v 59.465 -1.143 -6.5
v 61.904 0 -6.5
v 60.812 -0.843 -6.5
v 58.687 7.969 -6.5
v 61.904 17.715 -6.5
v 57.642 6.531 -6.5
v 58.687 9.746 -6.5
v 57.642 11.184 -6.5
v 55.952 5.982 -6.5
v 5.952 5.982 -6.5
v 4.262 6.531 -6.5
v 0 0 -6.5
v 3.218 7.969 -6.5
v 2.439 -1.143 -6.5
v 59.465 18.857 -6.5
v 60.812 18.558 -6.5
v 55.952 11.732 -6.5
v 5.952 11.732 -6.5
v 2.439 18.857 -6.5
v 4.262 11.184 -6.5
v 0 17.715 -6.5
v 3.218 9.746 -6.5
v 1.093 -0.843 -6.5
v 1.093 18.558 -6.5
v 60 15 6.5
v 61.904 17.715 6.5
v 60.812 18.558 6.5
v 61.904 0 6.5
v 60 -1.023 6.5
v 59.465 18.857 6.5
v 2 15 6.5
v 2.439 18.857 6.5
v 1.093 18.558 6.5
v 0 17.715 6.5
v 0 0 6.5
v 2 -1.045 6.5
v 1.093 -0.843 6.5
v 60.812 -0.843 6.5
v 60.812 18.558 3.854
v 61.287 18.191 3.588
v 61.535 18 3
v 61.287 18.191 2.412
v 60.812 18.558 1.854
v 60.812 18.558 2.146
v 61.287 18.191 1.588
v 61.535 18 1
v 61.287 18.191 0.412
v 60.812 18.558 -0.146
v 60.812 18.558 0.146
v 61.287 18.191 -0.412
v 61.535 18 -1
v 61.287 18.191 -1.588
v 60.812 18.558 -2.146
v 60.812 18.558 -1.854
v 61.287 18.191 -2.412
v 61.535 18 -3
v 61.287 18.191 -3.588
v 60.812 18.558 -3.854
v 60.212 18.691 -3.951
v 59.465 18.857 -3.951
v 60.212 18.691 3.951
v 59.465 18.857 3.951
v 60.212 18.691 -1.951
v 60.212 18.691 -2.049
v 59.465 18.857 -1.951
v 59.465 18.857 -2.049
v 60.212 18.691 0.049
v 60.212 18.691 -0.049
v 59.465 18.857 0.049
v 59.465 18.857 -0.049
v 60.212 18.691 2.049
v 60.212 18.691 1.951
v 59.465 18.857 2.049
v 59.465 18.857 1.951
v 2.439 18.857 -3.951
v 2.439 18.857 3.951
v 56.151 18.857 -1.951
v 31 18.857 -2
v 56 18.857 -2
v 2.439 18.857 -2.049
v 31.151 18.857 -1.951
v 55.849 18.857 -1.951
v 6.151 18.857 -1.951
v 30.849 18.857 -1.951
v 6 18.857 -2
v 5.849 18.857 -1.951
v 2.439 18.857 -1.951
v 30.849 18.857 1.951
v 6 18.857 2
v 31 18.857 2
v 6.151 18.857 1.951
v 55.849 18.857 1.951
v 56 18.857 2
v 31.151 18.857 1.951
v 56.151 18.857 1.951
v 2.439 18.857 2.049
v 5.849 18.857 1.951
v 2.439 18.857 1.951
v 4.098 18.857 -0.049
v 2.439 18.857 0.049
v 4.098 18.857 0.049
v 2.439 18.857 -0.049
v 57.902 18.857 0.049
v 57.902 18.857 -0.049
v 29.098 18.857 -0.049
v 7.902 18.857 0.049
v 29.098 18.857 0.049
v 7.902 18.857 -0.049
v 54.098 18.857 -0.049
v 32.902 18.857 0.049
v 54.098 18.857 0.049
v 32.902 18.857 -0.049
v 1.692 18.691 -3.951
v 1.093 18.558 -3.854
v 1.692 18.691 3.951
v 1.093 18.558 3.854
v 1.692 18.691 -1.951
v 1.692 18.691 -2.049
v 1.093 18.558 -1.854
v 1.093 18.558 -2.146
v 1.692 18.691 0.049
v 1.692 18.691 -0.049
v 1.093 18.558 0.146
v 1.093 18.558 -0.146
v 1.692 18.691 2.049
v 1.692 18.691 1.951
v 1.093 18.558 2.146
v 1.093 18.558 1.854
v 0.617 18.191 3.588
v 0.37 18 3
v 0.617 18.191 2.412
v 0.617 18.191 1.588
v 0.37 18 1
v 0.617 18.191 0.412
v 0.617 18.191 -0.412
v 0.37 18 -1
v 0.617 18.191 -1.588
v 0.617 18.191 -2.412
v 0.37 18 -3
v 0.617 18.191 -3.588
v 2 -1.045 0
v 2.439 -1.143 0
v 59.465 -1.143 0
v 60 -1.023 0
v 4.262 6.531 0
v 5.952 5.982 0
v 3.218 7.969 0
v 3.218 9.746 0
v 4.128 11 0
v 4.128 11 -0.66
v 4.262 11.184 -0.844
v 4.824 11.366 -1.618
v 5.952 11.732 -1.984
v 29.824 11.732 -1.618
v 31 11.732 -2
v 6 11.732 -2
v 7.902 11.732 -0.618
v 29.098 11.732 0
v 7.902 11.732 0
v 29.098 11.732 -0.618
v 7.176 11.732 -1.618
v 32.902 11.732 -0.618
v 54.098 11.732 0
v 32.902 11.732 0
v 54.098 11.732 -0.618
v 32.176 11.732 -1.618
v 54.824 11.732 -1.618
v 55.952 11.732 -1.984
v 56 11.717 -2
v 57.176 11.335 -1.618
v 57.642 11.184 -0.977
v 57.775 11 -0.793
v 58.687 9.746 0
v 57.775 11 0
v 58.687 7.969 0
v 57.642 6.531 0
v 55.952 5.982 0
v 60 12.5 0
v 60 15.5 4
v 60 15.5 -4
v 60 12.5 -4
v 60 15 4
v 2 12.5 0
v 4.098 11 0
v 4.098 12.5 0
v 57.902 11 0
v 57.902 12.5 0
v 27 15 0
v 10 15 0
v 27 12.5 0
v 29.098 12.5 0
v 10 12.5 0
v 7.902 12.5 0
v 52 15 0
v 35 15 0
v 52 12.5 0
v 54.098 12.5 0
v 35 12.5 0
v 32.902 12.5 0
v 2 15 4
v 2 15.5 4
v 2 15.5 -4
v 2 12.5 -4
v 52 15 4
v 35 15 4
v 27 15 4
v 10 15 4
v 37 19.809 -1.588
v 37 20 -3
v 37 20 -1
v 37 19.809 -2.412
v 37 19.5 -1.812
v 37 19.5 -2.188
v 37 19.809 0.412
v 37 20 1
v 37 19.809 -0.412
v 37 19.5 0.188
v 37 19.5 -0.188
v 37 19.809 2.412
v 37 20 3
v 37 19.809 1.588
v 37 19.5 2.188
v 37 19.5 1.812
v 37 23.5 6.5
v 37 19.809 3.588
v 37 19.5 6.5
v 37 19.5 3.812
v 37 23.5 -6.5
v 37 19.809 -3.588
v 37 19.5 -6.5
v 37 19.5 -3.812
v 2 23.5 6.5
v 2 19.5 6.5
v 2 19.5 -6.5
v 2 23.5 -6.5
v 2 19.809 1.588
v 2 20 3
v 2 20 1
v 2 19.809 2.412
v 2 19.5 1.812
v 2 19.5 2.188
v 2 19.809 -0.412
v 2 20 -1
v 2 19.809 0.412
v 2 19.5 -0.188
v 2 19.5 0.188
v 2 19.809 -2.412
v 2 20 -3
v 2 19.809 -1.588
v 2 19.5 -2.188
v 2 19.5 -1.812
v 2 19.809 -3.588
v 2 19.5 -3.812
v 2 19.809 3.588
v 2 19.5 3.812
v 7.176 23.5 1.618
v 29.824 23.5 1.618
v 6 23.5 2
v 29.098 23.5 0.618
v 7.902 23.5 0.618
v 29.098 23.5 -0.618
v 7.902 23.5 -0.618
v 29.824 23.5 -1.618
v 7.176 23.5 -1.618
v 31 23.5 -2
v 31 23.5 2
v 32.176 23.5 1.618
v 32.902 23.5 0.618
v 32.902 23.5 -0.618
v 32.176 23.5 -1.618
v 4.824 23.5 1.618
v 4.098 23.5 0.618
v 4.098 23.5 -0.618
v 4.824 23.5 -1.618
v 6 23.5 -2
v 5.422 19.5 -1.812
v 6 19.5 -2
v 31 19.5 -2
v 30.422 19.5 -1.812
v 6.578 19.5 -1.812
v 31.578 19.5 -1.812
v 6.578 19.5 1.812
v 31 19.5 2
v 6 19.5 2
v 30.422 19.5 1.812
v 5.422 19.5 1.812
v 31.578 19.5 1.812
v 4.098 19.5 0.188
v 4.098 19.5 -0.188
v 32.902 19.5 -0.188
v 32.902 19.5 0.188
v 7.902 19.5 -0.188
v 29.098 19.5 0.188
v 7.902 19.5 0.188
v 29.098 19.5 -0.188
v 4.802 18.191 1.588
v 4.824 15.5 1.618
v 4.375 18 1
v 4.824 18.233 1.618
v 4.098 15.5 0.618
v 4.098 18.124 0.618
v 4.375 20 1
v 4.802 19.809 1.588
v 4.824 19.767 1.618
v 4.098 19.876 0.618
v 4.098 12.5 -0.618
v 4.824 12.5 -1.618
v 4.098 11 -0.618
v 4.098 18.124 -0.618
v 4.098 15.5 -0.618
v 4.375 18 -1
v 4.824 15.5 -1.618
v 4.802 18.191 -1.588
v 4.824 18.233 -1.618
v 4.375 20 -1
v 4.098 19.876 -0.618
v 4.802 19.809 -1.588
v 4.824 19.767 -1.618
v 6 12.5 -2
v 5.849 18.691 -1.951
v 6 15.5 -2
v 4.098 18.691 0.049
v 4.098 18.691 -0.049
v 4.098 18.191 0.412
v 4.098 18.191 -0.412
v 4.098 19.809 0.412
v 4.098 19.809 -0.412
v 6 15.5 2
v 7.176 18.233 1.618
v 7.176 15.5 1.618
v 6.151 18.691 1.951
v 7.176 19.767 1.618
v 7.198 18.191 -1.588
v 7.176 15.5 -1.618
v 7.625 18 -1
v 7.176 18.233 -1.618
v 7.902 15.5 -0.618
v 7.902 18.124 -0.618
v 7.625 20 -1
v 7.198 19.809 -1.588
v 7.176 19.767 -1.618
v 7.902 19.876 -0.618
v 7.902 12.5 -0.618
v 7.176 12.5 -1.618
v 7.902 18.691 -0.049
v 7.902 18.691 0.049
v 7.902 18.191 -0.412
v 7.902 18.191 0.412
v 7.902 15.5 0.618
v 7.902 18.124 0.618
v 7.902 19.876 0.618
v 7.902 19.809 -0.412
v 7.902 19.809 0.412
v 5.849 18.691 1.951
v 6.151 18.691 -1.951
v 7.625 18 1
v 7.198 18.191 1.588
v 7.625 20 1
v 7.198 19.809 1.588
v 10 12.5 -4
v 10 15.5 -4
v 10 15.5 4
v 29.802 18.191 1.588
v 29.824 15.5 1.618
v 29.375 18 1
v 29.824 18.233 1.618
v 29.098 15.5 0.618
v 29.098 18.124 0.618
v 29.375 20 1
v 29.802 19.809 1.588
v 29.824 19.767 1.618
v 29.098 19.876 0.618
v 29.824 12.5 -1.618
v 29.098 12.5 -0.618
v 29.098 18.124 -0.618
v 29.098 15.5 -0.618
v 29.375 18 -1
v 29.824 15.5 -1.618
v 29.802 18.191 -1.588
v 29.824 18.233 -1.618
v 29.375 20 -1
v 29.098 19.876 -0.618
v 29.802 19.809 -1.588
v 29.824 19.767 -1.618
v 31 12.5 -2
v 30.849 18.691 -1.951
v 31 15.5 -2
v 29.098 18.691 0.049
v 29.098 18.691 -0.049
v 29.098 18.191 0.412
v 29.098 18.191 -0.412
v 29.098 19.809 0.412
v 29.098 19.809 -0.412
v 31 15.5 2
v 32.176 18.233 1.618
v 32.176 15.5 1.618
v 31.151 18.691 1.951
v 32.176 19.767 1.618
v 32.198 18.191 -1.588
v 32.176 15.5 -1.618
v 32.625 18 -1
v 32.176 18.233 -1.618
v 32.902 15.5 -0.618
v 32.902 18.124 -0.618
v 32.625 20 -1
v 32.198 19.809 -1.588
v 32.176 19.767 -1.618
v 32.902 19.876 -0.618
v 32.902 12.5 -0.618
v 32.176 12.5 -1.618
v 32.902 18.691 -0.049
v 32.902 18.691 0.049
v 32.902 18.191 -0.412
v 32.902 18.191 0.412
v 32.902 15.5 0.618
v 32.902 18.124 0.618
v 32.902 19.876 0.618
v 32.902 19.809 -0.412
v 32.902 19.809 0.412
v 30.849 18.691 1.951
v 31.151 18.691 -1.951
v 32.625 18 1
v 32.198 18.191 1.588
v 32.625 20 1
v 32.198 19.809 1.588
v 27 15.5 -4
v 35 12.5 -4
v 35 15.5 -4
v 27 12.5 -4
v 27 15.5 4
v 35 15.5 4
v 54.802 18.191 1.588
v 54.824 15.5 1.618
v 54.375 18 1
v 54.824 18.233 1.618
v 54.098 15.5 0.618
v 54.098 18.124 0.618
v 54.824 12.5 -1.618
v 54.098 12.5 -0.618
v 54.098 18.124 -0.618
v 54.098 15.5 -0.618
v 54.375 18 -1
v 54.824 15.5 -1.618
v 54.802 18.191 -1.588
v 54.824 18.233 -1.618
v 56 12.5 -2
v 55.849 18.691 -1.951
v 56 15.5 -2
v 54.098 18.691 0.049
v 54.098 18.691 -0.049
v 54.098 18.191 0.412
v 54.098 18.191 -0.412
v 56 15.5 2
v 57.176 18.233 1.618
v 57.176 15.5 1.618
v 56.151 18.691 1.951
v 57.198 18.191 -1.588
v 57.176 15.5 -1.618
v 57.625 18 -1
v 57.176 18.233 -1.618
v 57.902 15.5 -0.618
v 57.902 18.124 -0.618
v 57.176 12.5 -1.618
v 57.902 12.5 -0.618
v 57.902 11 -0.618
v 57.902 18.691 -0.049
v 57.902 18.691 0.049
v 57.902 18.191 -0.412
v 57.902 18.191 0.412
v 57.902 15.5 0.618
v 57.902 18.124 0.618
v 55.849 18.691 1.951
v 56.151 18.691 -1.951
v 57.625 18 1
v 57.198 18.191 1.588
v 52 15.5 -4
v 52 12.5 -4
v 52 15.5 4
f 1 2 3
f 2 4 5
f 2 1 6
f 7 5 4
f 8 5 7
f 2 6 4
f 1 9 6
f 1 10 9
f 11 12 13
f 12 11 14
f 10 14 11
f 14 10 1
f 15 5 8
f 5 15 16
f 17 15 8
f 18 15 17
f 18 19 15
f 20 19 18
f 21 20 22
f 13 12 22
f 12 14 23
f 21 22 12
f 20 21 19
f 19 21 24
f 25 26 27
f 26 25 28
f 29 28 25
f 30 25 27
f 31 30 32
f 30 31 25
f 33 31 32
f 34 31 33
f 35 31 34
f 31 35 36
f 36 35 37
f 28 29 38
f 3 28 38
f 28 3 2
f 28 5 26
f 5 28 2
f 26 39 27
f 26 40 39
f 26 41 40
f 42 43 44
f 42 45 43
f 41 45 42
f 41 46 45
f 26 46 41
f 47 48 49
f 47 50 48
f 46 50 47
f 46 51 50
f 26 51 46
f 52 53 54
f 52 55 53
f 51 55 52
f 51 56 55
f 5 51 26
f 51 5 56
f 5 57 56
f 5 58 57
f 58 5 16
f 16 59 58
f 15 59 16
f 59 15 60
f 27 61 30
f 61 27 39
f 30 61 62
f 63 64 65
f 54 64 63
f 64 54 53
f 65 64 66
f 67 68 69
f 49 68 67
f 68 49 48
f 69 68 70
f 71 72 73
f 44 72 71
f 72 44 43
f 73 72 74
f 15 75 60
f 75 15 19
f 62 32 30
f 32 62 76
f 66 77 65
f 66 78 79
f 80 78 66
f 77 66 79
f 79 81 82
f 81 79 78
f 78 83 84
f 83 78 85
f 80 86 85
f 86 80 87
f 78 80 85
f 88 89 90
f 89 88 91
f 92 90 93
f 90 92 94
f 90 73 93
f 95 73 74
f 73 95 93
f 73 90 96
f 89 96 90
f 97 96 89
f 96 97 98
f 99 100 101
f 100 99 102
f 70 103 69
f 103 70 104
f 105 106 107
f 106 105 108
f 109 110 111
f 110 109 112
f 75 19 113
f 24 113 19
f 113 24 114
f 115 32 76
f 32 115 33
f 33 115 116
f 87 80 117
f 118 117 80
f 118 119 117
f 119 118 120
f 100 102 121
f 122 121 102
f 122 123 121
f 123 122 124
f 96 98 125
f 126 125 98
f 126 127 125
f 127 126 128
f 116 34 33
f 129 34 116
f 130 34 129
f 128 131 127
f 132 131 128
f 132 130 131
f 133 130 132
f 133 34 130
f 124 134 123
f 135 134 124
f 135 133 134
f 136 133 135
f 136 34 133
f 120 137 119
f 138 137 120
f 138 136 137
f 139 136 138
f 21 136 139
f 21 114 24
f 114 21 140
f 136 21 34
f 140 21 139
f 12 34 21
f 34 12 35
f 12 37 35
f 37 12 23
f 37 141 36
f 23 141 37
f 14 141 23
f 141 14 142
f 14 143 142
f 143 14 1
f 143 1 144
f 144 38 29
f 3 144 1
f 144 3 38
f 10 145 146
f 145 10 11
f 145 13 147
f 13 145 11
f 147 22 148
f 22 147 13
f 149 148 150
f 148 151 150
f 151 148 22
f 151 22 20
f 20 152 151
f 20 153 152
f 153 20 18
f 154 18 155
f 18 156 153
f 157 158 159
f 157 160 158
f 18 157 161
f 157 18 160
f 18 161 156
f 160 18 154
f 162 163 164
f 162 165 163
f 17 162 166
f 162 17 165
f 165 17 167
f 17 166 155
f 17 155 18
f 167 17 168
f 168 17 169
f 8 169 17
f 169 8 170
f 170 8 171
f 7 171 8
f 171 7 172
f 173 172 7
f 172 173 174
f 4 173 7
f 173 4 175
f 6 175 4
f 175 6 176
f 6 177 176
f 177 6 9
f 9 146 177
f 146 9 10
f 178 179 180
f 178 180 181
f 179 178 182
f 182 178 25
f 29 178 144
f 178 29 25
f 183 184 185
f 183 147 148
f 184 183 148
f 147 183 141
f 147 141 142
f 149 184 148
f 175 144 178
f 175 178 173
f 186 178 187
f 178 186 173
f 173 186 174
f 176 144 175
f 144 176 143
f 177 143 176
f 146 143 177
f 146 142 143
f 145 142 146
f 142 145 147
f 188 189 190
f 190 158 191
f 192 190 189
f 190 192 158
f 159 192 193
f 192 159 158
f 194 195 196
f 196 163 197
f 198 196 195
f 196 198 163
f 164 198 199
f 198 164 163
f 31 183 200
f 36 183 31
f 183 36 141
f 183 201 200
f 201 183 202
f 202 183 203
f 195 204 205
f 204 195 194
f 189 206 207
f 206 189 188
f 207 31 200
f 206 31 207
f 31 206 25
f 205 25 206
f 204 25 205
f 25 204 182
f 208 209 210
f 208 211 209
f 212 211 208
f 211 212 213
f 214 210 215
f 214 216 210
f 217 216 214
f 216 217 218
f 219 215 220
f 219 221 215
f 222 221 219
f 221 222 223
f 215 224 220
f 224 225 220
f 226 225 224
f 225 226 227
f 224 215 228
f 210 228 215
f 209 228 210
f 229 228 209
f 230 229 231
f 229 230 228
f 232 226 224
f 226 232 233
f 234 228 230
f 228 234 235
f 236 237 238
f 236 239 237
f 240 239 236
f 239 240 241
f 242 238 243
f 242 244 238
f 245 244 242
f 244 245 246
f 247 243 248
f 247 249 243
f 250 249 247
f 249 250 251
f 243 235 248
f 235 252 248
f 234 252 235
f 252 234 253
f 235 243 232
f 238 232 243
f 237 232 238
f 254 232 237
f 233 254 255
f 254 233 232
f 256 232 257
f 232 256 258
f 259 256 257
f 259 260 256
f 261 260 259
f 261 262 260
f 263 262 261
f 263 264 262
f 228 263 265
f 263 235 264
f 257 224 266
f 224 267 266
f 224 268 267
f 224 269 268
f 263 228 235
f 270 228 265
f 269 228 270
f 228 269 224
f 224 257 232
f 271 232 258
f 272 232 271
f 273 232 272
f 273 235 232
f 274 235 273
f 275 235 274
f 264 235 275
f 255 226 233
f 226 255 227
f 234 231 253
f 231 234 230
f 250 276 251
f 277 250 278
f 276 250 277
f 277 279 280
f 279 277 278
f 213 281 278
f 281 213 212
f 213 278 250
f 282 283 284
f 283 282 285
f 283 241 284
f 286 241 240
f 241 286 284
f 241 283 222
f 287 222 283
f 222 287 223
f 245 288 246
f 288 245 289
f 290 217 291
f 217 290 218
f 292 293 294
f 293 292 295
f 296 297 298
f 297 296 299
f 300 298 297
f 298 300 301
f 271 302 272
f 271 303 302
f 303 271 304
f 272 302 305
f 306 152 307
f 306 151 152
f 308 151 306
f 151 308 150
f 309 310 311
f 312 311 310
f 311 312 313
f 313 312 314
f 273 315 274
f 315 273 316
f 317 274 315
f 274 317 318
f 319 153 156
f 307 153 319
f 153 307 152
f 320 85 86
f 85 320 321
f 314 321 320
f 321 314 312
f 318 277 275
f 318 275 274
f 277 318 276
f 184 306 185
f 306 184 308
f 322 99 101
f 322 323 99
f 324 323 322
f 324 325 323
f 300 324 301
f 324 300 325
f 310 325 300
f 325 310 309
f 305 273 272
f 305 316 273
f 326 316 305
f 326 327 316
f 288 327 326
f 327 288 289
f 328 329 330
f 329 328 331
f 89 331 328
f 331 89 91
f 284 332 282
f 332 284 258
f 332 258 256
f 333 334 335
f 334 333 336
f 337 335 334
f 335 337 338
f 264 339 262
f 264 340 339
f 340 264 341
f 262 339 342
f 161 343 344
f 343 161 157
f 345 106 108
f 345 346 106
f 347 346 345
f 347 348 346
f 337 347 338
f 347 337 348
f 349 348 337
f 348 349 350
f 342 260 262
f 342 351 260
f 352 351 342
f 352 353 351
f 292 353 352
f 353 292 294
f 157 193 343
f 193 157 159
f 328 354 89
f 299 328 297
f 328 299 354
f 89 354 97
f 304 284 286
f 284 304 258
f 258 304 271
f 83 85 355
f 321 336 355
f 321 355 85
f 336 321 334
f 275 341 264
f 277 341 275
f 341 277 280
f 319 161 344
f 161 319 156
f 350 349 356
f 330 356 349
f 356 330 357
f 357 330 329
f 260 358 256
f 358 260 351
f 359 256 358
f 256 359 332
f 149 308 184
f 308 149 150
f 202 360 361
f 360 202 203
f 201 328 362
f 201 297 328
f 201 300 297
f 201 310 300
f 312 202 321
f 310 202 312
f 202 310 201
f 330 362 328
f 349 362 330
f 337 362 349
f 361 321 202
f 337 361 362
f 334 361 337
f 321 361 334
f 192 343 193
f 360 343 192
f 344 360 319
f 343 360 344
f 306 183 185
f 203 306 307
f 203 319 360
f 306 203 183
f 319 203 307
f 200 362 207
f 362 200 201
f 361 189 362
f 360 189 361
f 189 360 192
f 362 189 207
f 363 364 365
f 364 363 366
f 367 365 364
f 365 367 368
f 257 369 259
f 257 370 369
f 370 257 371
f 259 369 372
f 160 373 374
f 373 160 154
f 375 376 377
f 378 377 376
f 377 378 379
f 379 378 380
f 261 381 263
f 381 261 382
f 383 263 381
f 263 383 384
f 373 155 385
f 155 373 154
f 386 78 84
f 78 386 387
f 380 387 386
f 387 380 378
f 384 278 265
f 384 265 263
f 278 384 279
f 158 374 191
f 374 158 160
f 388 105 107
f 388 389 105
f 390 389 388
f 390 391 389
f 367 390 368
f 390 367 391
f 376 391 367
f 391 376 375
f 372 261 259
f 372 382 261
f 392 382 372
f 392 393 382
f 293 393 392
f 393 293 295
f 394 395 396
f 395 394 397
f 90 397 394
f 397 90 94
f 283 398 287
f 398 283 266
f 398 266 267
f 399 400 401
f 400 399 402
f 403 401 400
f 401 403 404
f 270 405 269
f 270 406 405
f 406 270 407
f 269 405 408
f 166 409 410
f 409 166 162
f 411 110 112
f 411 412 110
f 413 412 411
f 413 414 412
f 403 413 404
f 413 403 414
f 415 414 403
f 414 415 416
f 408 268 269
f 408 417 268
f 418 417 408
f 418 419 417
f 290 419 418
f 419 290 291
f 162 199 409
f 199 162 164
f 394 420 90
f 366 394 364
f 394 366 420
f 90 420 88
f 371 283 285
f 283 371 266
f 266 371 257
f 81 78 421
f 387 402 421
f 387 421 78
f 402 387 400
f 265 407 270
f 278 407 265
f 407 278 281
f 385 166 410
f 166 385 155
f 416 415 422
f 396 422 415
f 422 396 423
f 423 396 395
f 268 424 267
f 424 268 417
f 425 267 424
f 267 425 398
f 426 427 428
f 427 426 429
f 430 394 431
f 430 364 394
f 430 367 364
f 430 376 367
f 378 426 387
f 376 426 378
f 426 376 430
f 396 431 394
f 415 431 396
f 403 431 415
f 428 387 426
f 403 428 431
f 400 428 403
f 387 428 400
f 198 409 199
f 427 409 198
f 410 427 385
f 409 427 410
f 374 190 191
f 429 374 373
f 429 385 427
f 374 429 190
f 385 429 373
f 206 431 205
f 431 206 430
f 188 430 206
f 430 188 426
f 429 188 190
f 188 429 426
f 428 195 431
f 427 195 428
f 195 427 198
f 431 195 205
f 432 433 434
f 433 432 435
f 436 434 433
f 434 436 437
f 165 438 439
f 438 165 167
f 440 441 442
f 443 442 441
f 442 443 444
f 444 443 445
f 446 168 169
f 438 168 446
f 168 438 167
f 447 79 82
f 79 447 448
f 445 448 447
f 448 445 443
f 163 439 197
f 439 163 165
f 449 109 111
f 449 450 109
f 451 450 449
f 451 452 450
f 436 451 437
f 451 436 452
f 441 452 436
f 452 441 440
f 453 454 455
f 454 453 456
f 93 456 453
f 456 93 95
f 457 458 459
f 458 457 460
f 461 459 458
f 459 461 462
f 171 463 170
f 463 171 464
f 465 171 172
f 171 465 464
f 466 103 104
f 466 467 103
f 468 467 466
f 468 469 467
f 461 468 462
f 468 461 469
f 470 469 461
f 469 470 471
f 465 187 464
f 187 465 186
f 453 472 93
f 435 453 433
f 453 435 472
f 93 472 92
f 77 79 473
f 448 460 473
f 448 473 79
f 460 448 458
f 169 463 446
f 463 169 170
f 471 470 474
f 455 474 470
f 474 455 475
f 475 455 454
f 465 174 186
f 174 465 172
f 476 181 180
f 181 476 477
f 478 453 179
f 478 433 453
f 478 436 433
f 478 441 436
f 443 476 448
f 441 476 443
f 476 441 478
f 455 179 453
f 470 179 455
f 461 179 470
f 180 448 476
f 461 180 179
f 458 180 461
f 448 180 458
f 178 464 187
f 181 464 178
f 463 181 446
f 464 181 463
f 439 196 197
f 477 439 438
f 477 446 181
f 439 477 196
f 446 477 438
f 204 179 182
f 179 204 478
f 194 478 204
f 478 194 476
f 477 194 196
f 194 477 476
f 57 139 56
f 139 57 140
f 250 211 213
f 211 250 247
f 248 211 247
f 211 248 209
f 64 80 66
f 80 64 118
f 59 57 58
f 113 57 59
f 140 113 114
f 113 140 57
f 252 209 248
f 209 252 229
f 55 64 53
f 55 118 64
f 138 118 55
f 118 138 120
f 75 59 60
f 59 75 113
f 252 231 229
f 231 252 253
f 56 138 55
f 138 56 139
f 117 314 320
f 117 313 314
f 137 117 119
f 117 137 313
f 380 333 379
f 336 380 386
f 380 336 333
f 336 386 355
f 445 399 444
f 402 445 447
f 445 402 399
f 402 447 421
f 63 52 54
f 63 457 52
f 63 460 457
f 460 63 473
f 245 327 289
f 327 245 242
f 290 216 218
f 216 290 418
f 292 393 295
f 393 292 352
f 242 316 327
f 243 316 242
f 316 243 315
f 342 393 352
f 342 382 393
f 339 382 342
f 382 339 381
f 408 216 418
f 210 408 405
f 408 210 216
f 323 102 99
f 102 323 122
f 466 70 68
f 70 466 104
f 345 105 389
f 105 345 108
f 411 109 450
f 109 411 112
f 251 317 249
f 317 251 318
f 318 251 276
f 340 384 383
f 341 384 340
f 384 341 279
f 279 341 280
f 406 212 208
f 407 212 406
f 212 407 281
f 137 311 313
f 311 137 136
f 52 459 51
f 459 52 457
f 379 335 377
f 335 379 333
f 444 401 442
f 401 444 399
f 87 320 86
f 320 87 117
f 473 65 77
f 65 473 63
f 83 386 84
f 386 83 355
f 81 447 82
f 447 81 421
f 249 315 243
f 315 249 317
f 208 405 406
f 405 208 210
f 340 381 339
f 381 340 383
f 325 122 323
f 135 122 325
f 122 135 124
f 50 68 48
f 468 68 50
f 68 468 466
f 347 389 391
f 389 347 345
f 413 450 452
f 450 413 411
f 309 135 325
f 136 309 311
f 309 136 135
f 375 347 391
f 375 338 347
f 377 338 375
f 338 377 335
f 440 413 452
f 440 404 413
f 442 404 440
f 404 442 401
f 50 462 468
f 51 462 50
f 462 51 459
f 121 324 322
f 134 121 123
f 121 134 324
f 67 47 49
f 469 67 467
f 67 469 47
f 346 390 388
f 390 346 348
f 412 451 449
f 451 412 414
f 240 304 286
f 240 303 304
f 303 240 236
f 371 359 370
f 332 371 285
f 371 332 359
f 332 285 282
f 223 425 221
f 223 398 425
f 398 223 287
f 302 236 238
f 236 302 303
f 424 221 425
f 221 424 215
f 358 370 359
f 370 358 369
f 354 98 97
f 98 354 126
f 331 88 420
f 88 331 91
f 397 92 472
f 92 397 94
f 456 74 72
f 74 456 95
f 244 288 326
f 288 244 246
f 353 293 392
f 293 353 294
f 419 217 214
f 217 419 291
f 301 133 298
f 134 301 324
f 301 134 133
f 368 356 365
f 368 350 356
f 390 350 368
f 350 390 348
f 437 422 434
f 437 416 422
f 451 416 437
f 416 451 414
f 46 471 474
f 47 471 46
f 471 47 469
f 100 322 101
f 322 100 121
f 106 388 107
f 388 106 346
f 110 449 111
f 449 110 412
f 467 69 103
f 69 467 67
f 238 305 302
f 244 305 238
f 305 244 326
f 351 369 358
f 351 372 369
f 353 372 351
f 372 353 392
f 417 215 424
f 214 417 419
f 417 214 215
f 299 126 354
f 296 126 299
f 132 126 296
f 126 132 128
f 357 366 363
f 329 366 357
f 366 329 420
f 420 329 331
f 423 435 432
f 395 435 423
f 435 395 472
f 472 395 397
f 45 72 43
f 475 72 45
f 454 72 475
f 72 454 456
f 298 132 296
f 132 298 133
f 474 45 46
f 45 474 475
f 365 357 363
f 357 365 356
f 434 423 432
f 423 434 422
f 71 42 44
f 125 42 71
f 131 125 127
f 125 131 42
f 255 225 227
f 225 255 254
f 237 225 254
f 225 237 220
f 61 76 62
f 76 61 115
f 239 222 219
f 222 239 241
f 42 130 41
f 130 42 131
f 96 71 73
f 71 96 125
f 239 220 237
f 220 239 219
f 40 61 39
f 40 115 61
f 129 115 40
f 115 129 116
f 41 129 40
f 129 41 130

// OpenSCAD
module base() {
  difference() {
    linear_extrude(height = 13, center = true, convexity = 10)
       import (file = "pulley_support.dxf", layer = "0");
    translate([2,-3,0]) cube([58,18,10]);
  }
}

module screw() {
  union() {
    translate([0,0,5])cylinder(r1=4/2,r2=4/2,h=16, center=true, $fn=10);
    cube([8,8,3], center= true);
  }
}

module screws() {


  translate([0,14,0])
    rotate([0,90,90])
      screw();

  translate([25,14,0])
    rotate([0,90,90])
      screw();

  translate([50,14,0])
    rotate([0,90,90])
      screw();

}

module top() {
  cube([35,4,13]);
}

module strings() {
  rotate([90,0,90]) {
  translate([0,0,0]) cylinder(r1 = 1,r2 = 1, h=100, $fn=10);
  translate([0,2,0]) cylinder(r1 = 1,r2 = 1, h=100, $fn=10);
  translate([0,4,0]) cylinder(r1 = 1,r2 = 1, h=100, $fn=10);
  translate([0,6,0]) cylinder(r1 = 1,r2 = 1, h=100, $fn=10);
  }
}

difference() {
  difference(){
    union() {
      base();
      translate([2,19.5,-6.5])top();
    }
    translate([6,0,0]) 
      screws();

  }
  translate([0,19,-3]) strings();
}
